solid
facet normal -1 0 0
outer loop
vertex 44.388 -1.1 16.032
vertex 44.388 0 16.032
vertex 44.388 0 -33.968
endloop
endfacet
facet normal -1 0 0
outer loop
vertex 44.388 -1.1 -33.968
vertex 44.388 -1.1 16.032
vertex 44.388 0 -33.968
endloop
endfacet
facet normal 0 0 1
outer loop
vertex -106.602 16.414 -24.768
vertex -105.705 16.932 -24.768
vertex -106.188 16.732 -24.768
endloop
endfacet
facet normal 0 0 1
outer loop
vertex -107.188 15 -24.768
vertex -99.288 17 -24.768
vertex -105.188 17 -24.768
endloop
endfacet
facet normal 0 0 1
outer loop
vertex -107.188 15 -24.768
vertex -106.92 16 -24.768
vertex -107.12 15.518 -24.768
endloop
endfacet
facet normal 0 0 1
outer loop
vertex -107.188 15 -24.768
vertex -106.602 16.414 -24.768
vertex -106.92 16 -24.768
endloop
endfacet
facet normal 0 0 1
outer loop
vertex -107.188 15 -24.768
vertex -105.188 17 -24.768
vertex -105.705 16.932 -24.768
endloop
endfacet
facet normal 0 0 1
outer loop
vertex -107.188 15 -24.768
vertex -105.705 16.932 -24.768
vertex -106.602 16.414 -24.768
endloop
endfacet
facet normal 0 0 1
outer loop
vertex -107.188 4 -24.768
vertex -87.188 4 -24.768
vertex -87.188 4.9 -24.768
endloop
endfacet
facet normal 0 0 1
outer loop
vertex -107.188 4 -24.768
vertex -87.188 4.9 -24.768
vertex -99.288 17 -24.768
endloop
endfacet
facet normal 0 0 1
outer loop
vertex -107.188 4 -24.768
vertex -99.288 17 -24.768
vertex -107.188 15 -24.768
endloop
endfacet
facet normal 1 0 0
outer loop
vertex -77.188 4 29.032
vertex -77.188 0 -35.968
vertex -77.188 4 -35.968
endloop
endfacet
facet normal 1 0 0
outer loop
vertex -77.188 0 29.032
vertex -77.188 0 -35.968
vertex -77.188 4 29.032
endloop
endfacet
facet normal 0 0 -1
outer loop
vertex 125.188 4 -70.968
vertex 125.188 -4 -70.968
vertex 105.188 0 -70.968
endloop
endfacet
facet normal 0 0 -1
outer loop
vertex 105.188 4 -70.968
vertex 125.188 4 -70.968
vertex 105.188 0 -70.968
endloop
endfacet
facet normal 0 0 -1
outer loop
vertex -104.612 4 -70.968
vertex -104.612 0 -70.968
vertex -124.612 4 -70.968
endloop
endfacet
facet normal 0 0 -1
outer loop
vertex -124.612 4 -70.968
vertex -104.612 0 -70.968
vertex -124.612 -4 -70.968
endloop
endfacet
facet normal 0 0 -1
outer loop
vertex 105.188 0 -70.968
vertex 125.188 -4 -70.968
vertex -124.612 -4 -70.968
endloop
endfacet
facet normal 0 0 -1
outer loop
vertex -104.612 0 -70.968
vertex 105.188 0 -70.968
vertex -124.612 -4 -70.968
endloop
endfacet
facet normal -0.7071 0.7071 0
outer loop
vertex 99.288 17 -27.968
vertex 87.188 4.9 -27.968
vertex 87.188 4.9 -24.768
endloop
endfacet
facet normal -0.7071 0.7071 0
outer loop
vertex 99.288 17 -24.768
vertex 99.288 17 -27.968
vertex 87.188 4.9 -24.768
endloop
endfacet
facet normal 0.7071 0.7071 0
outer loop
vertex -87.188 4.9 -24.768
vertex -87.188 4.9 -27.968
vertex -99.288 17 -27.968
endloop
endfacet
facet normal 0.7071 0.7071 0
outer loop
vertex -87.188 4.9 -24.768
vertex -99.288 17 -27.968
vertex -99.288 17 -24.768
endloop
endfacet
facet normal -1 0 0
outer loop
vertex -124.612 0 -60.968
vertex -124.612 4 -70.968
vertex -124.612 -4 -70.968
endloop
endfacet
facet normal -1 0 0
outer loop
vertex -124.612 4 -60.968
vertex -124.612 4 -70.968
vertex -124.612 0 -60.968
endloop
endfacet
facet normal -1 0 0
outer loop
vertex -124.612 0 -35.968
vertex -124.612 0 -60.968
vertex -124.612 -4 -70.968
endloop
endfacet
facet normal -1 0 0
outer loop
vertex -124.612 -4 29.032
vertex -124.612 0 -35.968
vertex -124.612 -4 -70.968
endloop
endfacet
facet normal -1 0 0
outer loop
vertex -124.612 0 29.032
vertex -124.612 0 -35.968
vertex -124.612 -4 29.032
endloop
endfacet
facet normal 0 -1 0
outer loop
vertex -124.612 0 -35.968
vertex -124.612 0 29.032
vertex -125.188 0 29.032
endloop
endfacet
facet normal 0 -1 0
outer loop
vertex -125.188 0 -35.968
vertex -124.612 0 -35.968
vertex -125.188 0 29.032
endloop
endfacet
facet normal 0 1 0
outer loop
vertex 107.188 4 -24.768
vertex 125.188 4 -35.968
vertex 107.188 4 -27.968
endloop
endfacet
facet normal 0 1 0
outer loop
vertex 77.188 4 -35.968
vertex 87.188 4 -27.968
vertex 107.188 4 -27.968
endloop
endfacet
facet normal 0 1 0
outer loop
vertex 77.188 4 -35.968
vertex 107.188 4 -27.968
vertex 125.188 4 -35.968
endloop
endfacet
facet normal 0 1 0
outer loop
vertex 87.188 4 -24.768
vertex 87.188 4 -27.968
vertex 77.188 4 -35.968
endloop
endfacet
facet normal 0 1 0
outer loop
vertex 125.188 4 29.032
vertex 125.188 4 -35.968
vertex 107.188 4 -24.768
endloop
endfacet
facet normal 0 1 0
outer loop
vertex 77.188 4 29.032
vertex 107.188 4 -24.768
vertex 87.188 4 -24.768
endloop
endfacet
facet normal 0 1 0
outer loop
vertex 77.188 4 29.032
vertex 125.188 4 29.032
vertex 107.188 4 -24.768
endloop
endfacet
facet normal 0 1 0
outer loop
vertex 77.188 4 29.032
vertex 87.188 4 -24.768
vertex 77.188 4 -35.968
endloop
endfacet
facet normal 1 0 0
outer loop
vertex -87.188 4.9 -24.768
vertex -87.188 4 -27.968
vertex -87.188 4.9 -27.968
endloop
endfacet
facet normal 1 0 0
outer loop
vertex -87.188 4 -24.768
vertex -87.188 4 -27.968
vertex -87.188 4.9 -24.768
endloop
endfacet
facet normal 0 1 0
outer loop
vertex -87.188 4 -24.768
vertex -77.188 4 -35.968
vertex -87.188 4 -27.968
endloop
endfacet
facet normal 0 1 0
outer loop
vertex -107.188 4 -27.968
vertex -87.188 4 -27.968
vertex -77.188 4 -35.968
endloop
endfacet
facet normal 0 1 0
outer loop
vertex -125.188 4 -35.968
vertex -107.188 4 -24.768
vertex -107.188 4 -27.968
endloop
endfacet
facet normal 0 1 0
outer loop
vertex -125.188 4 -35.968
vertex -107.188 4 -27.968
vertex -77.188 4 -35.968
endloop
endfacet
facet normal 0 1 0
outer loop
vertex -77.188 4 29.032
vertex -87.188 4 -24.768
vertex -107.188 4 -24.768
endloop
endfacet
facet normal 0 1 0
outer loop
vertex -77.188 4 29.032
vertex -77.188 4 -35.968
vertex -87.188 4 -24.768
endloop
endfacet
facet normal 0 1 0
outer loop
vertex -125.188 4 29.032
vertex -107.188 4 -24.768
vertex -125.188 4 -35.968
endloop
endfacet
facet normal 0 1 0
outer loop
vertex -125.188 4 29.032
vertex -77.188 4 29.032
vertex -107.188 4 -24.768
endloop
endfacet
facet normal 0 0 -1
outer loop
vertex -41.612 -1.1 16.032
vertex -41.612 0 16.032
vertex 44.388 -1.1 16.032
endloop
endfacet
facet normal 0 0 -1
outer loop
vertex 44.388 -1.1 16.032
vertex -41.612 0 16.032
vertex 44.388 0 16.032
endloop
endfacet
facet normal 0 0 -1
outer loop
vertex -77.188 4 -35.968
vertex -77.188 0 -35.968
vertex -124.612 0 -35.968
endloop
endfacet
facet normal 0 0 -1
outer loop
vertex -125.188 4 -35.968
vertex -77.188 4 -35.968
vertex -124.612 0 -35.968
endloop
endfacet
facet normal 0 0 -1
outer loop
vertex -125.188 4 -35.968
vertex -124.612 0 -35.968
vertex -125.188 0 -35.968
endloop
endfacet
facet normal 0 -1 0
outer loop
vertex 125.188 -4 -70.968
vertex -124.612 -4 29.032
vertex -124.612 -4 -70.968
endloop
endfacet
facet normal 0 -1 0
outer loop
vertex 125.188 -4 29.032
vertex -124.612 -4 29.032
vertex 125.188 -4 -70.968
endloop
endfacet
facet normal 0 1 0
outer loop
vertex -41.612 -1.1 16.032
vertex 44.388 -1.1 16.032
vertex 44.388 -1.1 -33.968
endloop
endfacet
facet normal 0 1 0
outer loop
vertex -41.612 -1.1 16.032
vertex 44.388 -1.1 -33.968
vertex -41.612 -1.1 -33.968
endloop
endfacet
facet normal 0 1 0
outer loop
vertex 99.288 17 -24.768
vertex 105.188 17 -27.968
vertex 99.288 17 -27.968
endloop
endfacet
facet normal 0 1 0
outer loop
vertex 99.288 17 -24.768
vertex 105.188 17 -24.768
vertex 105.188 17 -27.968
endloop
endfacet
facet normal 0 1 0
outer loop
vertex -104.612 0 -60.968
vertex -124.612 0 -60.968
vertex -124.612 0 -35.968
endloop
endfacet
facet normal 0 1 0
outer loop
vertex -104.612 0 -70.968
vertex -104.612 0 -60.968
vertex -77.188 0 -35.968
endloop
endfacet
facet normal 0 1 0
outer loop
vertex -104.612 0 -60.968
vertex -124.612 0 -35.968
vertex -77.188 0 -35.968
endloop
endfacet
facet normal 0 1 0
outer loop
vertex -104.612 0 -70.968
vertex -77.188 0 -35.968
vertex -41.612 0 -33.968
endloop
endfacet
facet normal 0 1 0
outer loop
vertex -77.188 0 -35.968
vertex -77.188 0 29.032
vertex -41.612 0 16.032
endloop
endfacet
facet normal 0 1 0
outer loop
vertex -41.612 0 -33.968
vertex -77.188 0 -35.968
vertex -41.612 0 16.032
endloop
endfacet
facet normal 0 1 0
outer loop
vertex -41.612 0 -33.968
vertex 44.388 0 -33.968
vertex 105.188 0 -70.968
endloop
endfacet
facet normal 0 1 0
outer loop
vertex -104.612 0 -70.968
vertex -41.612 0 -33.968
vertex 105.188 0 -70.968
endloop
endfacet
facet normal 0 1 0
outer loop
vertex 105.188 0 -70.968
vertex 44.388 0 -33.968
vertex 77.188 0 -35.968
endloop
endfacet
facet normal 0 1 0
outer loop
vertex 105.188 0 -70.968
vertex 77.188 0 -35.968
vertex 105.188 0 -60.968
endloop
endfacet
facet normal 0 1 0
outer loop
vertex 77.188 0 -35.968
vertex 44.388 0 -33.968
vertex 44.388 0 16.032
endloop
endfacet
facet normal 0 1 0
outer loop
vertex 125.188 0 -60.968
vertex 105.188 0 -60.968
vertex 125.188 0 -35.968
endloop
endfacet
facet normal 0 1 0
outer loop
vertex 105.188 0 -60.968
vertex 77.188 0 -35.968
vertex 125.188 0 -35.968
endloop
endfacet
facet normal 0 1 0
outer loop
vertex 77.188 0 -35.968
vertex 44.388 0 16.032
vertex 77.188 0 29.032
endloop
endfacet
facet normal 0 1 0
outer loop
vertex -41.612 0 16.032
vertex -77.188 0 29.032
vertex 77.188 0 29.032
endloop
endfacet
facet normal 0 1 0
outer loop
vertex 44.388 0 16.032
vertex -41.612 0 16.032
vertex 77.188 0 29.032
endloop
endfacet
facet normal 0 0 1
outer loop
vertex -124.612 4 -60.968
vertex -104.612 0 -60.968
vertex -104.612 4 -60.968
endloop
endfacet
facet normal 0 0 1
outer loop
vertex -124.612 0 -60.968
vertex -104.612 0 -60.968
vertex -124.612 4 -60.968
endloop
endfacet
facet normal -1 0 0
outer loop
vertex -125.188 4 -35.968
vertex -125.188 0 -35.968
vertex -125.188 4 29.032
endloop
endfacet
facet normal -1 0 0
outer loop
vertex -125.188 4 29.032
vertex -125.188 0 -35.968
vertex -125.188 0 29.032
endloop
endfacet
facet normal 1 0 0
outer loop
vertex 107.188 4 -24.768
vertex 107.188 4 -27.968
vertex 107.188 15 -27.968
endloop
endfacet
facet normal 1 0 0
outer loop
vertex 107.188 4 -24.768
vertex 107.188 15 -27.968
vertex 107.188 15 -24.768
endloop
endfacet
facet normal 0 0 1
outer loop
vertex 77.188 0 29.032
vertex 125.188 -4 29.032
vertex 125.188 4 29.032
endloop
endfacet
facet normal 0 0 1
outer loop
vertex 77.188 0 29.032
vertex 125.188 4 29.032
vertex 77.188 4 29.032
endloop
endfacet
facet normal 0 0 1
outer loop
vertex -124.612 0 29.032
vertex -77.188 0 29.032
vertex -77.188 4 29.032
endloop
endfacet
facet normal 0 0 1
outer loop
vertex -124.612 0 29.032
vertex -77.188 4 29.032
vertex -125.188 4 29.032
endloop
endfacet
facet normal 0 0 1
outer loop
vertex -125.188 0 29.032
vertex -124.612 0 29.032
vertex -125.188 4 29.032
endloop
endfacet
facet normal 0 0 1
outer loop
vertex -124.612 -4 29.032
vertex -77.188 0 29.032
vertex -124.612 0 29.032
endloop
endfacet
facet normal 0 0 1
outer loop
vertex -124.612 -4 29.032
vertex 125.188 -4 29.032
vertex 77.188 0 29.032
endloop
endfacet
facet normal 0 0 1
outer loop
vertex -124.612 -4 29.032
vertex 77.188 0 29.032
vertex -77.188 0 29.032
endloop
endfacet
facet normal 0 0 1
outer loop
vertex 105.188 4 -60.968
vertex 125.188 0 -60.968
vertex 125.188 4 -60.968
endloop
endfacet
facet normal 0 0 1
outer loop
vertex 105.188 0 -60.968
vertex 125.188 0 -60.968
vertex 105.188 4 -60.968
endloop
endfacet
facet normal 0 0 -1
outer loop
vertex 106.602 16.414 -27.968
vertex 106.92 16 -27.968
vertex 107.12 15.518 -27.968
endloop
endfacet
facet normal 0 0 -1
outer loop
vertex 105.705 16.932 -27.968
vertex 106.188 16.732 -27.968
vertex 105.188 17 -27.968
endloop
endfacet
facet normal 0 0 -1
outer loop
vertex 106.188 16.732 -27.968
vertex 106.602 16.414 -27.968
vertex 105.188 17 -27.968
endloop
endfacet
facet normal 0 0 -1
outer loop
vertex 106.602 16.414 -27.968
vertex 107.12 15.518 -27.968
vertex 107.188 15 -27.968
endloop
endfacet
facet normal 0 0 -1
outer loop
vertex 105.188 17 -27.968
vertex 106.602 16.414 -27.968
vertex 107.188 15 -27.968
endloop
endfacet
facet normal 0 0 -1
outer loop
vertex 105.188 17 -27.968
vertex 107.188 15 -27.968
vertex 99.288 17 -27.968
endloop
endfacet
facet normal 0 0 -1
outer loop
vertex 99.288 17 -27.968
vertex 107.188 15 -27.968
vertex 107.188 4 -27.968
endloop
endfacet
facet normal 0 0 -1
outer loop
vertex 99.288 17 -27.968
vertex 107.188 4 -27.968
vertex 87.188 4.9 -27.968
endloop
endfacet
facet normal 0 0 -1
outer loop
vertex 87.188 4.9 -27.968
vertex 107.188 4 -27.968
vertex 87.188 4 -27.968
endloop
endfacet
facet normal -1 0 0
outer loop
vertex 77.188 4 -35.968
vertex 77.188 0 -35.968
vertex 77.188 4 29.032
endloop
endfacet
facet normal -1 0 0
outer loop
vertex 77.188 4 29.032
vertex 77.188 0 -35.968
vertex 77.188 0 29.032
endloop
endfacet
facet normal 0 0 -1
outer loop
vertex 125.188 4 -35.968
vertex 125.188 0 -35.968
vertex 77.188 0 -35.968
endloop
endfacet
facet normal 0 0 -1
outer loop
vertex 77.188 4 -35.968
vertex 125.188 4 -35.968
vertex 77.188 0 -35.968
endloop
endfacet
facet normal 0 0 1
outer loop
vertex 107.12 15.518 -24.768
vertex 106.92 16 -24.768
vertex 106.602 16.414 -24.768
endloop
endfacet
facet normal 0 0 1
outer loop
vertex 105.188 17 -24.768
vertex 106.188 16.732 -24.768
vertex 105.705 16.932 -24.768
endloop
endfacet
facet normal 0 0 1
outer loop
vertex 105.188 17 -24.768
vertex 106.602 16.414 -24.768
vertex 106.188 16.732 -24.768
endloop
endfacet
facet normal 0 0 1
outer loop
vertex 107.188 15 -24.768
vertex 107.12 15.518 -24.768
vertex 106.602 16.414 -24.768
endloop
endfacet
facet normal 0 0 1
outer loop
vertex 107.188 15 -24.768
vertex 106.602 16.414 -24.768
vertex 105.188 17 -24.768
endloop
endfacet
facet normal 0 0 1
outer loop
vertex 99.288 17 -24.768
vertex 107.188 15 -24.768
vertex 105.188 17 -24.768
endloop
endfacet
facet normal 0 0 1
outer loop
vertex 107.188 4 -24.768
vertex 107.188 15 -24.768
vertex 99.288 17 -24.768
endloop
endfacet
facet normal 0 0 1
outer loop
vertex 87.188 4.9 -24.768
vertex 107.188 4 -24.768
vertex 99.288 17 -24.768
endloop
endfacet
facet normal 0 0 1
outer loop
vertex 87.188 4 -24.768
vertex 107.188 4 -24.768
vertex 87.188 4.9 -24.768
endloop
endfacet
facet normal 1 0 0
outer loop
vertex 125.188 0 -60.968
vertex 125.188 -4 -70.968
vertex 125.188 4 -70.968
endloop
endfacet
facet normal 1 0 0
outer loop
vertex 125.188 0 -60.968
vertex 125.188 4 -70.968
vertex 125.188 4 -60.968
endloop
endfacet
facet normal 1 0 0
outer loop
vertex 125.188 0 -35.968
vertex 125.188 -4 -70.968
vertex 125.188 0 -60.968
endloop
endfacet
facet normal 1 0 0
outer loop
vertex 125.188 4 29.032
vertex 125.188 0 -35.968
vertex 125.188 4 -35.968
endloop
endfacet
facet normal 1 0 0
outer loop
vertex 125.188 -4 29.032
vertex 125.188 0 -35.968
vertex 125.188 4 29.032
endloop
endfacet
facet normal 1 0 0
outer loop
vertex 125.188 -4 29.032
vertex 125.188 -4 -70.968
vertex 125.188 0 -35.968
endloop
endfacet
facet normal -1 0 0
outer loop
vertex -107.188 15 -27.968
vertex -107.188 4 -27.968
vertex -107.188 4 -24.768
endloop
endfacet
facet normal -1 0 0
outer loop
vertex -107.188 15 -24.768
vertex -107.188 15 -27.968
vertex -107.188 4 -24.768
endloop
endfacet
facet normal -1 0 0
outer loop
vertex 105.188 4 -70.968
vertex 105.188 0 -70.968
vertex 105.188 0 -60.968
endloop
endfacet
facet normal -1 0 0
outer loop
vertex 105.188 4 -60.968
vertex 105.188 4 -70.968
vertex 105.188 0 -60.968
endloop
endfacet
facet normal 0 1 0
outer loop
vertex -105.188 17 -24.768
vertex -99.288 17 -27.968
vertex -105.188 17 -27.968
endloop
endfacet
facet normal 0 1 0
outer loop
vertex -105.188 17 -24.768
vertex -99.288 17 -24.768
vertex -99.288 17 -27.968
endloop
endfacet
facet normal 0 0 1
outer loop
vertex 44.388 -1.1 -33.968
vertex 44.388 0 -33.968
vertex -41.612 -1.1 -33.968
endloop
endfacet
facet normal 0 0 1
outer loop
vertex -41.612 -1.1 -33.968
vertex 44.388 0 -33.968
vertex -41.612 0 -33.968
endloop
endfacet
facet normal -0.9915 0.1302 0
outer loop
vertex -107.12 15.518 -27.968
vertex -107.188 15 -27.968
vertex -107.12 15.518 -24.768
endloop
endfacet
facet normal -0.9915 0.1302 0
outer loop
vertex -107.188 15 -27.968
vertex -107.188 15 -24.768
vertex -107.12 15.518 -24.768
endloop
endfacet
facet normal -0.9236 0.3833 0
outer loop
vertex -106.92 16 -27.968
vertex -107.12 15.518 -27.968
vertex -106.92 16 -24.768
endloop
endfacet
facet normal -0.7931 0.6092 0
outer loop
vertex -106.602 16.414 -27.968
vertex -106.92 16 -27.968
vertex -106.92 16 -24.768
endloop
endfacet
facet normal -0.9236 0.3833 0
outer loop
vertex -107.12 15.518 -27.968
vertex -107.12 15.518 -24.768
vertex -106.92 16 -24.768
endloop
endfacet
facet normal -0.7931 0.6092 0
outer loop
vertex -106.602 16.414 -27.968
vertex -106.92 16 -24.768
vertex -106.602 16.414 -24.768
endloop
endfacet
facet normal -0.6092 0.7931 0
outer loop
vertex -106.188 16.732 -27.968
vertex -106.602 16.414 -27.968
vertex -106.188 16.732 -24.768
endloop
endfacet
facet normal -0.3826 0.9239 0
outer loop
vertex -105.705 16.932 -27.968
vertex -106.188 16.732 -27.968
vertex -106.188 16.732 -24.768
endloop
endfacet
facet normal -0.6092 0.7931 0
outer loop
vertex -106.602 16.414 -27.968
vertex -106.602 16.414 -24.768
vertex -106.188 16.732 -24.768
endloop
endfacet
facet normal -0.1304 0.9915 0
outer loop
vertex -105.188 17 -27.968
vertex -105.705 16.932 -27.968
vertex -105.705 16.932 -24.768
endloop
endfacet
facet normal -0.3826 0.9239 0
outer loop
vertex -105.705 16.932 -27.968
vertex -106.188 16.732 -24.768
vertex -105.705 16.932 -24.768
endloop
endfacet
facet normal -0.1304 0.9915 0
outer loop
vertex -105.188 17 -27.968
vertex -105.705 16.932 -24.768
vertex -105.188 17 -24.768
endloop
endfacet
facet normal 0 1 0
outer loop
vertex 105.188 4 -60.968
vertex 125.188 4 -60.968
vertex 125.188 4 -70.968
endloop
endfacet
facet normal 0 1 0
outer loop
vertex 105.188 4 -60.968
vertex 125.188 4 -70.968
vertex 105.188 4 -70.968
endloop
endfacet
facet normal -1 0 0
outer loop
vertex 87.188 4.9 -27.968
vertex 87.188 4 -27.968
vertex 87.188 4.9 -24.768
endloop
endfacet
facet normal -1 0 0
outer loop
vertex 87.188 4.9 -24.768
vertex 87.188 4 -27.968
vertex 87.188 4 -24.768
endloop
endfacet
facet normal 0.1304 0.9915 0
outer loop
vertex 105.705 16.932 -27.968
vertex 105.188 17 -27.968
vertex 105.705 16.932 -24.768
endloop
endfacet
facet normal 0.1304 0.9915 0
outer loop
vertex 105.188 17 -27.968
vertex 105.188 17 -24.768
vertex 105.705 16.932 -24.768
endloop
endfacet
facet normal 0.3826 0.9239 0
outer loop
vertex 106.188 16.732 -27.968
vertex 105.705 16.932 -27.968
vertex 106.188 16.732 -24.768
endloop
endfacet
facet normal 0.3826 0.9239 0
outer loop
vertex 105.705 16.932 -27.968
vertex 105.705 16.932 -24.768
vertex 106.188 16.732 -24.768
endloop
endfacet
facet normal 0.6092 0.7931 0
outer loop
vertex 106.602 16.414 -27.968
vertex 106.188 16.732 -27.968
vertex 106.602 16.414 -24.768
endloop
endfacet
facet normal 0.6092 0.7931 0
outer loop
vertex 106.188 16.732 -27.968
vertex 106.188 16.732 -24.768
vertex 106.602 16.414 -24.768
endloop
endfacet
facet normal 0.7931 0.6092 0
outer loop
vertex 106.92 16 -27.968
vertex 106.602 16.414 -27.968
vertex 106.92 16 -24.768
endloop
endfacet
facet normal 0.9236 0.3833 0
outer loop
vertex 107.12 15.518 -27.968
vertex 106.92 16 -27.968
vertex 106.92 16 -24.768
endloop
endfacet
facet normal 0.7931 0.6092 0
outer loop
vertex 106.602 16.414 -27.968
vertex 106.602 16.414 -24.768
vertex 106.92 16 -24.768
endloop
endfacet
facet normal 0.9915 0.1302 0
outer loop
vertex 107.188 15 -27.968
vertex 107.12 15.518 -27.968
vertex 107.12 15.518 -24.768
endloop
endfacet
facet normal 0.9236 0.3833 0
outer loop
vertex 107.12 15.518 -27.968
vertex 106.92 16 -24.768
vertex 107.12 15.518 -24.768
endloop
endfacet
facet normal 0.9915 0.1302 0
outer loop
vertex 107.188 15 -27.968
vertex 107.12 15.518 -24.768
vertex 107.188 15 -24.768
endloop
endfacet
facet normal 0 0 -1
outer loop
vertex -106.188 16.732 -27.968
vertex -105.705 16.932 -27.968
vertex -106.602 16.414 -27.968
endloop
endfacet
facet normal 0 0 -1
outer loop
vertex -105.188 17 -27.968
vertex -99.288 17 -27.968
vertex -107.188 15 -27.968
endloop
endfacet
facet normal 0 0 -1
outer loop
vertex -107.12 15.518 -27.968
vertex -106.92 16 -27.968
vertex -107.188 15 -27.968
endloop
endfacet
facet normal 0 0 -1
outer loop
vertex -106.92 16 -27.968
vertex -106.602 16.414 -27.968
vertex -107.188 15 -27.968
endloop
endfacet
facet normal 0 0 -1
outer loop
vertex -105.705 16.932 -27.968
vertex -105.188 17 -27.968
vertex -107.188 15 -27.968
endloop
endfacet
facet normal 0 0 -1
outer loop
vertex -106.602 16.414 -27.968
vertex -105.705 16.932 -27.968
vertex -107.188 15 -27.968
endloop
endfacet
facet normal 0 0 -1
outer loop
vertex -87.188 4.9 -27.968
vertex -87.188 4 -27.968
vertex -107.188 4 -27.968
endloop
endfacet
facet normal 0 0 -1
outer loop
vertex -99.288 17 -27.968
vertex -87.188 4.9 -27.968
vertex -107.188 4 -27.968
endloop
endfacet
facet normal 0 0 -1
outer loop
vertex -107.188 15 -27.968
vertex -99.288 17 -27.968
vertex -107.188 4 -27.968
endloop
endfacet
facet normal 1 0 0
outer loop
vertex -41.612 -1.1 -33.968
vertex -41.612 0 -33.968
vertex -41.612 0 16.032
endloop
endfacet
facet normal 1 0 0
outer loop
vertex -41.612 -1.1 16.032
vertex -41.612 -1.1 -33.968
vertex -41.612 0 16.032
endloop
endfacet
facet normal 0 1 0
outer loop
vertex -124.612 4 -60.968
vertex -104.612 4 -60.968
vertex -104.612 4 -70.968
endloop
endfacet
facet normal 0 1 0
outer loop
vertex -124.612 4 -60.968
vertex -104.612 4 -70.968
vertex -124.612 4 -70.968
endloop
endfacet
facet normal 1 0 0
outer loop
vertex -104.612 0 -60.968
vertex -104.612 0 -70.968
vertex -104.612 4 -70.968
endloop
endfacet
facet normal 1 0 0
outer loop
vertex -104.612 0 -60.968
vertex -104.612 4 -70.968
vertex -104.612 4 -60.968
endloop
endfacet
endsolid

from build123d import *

# Parameters (mm, degrees)
F0_W      = 249.8
F0_H      = 100
F1_DEPTH  = 4
F4_W      = 20
F4_H      = 10
F5_DEPTH  = 4
F6_W      = 48
F6_H      = 65
F7_DEPTH  = 4
F8_W      = 20
F8_H      = 10
F9_DEPTH  = 4
F10_DEPTH = 1.1
F11_W     = 20
F11_H     = 3.2
F12_DEPTH = 13
F13_SIZE  = 12.1
F14_R     = 2


# Not quite as in the source:
# - a feature names something its author has since deleted; it is built from what else it names


with BuildPart() as f1:
    # F0 (on Front) → F1 (new body)
    with BuildSketch(Plane.XZ):
        with Locations((0.2878084779, -20.9680776408)):
            Rectangle(F0_W, F0_H)
    extrude(amount=F1_DEPTH)

    # F4 (on face) → F5 (join)
    with BuildSketch(Plane(origin=(0, 0, 0), x_dir=(-1, 0, 0), z_dir=(0, 1, 0))):
        with Locations((-115.1878084779, -65.9680776408)):
            Rectangle(F4_W, F4_H)
        with Locations((114.6121915221, -65.9680776408)):
            Rectangle(F4_W, F4_H)
    extrude(amount=F5_DEPTH)

    # F6 (on face) → F7 (join)
    with BuildSketch(Plane(origin=(0, 0, 0), x_dir=(-1, 0, 0), z_dir=(0, 1, 0))):
        with Locations((-101.1878084779, -3.4680776408)):
            Rectangle(F6_W, F6_H)
        with Locations((101.1878084779, -3.4680776408)):
            Rectangle(F6_W, F6_H)
    extrude(amount=F7_DEPTH)

    # F8 (on face) → F9 (join)
    with BuildSketch(Plane(origin=(0, 0, 0), x_dir=(-1, 0, 0), z_dir=(0, 1, 0))):
        with Locations((114.6121915221, -65.9680776408)):
            Rectangle(F8_W, F8_H)
    extrude(amount=F9_DEPTH)

    # F2 (on face) → F10 (cut)
    with BuildSketch(Plane(origin=(0, 0, 0), x_dir=(-1, 0, 0), z_dir=(0, 1, 0))):
        Polygon((41.6121915221, 16.0319223592), (-44.3878084779, 16.0319223592), (-44.3878084779, 6.0319223592), (-44.3878084779, -23.9680776408), (-44.3878084779, -33.9680776408), (41.6121915221, -33.9680776408), (41.6121915221, 6.0319223592), align=None)
    extrude(amount=-F10_DEPTH, mode=Mode.SUBTRACT)

    # F11 (on face) → F12 (join)
    with BuildSketch(Plane(origin=(0, 4, 0), x_dir=(-1, 0, 0), z_dir=(0, 1, 0))):
        with Locations((-97.1878084779, -26.3680776408)):
            Rectangle(F11_W, F11_H)
        with Locations((97.1878084779, -26.3680776408)):
            Rectangle(F11_W, F11_H)
    extrude(amount=F12_DEPTH)

    # F13
    f13_edges = [f1.edges().sort_by_distance(p)[0] for p in [
        (87.187808, 17, -26.368078),
        (-87.187808, 17, -26.368078),
    ]]
    chamfer(f13_edges, length=F13_SIZE)

    # F14
    f14_edges = [f1.edges().sort_by_distance(p)[0] for p in [
        (107.187808, 17, -26.368078),
        (-107.187808, 17, -26.368078),
    ]]
    fillet(f14_edges, radius=F14_R)


solid = f1.part
